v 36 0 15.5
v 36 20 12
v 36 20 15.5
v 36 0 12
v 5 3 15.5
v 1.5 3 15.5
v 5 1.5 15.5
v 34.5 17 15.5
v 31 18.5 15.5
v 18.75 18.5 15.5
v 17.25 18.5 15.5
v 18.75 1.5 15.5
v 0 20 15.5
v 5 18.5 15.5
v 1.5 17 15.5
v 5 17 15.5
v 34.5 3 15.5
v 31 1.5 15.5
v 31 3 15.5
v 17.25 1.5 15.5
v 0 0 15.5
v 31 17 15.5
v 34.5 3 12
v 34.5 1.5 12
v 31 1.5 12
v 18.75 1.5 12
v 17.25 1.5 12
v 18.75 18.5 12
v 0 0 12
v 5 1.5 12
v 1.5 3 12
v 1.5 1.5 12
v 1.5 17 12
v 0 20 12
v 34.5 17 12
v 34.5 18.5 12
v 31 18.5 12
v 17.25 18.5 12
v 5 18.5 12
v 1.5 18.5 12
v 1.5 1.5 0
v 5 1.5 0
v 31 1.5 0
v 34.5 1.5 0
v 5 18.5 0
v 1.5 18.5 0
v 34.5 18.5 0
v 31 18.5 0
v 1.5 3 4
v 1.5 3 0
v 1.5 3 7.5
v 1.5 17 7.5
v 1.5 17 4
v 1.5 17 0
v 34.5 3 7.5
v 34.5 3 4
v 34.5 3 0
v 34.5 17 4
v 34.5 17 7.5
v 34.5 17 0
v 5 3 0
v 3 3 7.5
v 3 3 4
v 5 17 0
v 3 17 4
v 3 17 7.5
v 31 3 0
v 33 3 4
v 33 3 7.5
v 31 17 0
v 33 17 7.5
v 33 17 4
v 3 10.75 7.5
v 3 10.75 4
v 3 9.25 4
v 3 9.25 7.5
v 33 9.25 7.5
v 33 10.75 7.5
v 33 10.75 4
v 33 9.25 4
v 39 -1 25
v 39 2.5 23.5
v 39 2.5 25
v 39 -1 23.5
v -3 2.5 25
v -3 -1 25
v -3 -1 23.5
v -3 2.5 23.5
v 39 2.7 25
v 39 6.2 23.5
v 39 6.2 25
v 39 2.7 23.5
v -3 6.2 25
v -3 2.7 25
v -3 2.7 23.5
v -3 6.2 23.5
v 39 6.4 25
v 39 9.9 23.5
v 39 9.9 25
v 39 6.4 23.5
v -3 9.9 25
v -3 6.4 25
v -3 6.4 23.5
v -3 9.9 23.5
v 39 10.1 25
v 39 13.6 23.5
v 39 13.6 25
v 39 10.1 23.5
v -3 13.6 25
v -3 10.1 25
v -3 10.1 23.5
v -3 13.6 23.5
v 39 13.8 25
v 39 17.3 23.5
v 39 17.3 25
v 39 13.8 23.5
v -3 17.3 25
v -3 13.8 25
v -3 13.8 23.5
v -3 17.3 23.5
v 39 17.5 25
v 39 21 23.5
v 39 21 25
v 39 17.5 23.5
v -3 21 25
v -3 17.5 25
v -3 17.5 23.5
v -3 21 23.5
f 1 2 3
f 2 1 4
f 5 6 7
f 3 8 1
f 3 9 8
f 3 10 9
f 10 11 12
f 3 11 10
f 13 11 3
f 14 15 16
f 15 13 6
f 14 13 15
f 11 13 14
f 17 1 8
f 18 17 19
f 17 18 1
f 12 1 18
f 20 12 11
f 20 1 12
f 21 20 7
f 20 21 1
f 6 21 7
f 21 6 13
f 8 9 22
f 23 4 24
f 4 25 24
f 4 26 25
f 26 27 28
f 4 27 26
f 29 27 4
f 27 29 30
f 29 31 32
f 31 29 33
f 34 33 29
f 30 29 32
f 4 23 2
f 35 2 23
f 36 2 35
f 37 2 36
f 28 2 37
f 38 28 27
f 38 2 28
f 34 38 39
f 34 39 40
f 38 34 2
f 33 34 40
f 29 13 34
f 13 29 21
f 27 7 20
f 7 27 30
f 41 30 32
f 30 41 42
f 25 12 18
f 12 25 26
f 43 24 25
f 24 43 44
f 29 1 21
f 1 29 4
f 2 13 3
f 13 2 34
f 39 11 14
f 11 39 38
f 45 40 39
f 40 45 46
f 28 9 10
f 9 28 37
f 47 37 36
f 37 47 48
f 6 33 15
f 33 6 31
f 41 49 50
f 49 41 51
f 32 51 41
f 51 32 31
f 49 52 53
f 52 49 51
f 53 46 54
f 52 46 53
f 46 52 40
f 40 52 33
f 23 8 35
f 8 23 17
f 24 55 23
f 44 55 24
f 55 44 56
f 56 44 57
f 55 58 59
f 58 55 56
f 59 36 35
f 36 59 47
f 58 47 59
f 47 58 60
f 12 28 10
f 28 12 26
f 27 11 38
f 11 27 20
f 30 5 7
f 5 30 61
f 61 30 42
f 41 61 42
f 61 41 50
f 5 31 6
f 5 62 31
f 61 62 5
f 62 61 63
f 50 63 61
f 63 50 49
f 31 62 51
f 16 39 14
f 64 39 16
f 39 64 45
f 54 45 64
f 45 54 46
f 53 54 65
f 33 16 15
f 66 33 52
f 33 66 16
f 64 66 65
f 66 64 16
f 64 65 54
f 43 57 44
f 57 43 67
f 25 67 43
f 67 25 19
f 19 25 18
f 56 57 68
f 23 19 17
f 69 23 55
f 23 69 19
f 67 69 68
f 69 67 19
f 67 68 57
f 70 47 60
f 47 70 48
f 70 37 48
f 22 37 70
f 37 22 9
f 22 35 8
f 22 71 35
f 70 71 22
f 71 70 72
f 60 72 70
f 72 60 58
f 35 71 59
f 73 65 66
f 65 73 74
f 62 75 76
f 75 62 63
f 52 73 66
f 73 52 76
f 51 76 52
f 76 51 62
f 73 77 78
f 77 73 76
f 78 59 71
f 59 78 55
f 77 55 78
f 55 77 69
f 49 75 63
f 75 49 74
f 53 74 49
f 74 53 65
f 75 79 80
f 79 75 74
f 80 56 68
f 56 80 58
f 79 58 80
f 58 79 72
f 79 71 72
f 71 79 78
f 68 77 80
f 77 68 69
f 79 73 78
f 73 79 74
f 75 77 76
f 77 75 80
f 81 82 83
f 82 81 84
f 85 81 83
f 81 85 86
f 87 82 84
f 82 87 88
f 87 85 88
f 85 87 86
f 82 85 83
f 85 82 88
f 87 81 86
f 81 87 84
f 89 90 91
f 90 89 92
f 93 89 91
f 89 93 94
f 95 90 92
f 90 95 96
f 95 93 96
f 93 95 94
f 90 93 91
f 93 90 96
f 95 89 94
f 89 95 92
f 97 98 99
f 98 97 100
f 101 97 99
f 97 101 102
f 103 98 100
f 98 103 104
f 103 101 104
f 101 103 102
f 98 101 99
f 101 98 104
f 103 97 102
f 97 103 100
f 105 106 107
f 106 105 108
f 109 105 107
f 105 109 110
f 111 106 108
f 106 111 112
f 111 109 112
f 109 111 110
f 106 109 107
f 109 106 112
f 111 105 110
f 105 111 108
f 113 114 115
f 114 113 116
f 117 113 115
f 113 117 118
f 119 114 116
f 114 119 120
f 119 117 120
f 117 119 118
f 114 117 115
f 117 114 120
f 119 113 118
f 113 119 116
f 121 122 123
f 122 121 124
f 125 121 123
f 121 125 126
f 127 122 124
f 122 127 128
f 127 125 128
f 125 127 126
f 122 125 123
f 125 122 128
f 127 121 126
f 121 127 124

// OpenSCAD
// bench.scad — slat-top bench built from 2x4 dimensional lumber
// Reproduces the design in bench1.png.
// Units: inches. X = length, Y = width, Z = height.

// ---- dimensional lumber (actual sizes) ----
TWOBY_T = 1.5;   // 2x4 thickness
TWOBY_W = 3.5;   // 2x4 width

// ---- overall design dimensions (from bench1.png) ----
TOP_LEN     = 42;    // top length
TOP_WID     = 22;    // top width
FRAME_LEN   = 36;    // apron frame outer length
FRAME_WID   = 20;    // apron frame outer width
BENCH_H     = 17;    // overall height
N_SLATS     = 6;     // slats across the 22" top

LEG_H       = BENCH_H - TWOBY_T;          // legs stop under the top slats
STRETCHER_Z = 4;                          // height of side stretcher above floor
SLAT_GAP    = (TOP_WID - N_SLATS*TWOBY_W) / (N_SLATS - 1);

EXPLODE = 8;   // lift of the top for the exploded view; set 0 to assemble

wood      = [0.72, 0.45, 0.20];
wood_dark = [0.60, 0.35, 0.15];

// ============ lumber pieces ============

// generic 2x4 stick, laid along X, cross-section t (Z) x w (Y)
module two_by_four(length, w = TWOBY_W, t = TWOBY_T) {
    cube([length, w, t]);
}

// --- top ---
// 2x4 laid flat, full 42" length
module top_slat() {
    color(wood) two_by_four(TOP_LEN);
}

// --- apron frame (2x4s on edge) ---
// long apron rail, full 36" — runs the length of the frame
module apron_long() {
    color(wood_dark) cube([FRAME_LEN, TWOBY_T, TWOBY_W]);
}

// short apron rail, fits between the long rails
module apron_short() {
    color(wood_dark) cube([TWOBY_T, FRAME_WID - 2*TWOBY_T, TWOBY_W]);
}

// center cross rail, same as a short apron rail
module cross_rail() {
    apron_short();
}

// --- legs ---
// 2x4 leg, floor to underside of top; wide face bolts to the long apron rail
module leg() {
    color(wood) cube([TWOBY_W, TWOBY_T, LEG_H]);
}

// --- side stretcher ---
// low rail butted BETWEEN the two legs of one end, flush with
// their outer faces
module stretcher() {
    color(wood_dark)
        cube([TWOBY_T, FRAME_WID - 2*TWOBY_T - 2*TWOBY_T, TWOBY_W]);
}

// --- bottom rail ---
// cross piece along the bottom, joining the two end stretchers
// at their centers
module bottom_rail() {
    color(wood_dark)
        cube([FRAME_LEN - 2*TWOBY_T - 2*TWOBY_T, TWOBY_T, TWOBY_W]);
}

// ============ assemblies ============

module top_assembly() {
    for (i = [0 : N_SLATS-1])
        translate([0, i*(TWOBY_W + SLAT_GAP), 0])
            top_slat();
}

module apron_assembly() {
    // two long rails
    translate([0, 0, 0])                     apron_long();
    translate([0, FRAME_WID - TWOBY_T, 0])   apron_long();
    // two end rails
    translate([0, TWOBY_T, 0])                       apron_short();
    translate([FRAME_LEN - TWOBY_T, TWOBY_T, 0])     apron_short();
    // center cross rail
    translate([FRAME_LEN/2 - TWOBY_T/2, TWOBY_T, 0]) cross_rail();
}

module base_assembly() {
    // apron frame sits at the top of the legs
    translate([0, 0, LEG_H - TWOBY_W]) apron_assembly();

    // legs against the inside of the long rails, inset 1.5" from each end:
    // outer faces land 33" apart along the length, 17" across the width
    leg_x = [TWOBY_T, FRAME_LEN - TWOBY_T - TWOBY_W];
    leg_y = [TWOBY_T, FRAME_WID - TWOBY_T - TWOBY_T];
    for (x = leg_x, y = leg_y)
        translate([x, y, 0]) leg();

    // side stretchers between each leg pair, flush with the legs'
    // outer (end-facing) faces
    stretcher_x = [leg_x[0], leg_x[1] + TWOBY_W - TWOBY_T];
    for (x = stretcher_x)
        translate([x, TWOBY_T + TWOBY_T, STRETCHER_Z])
            stretcher();

    // bottom cross piece spanning between the two end stretchers,
    // centered across the width
    translate([leg_x[0] + TWOBY_T, FRAME_WID/2 - TWOBY_T/2, STRETCHER_Z])
        bottom_rail();
}

module bench(explode = EXPLODE) {
    base_assembly();
    // top centered over the frame
    translate([(FRAME_LEN - TOP_LEN)/2, (FRAME_WID - TOP_WID)/2,
               LEG_H + explode])
        top_assembly();
}

bench();
